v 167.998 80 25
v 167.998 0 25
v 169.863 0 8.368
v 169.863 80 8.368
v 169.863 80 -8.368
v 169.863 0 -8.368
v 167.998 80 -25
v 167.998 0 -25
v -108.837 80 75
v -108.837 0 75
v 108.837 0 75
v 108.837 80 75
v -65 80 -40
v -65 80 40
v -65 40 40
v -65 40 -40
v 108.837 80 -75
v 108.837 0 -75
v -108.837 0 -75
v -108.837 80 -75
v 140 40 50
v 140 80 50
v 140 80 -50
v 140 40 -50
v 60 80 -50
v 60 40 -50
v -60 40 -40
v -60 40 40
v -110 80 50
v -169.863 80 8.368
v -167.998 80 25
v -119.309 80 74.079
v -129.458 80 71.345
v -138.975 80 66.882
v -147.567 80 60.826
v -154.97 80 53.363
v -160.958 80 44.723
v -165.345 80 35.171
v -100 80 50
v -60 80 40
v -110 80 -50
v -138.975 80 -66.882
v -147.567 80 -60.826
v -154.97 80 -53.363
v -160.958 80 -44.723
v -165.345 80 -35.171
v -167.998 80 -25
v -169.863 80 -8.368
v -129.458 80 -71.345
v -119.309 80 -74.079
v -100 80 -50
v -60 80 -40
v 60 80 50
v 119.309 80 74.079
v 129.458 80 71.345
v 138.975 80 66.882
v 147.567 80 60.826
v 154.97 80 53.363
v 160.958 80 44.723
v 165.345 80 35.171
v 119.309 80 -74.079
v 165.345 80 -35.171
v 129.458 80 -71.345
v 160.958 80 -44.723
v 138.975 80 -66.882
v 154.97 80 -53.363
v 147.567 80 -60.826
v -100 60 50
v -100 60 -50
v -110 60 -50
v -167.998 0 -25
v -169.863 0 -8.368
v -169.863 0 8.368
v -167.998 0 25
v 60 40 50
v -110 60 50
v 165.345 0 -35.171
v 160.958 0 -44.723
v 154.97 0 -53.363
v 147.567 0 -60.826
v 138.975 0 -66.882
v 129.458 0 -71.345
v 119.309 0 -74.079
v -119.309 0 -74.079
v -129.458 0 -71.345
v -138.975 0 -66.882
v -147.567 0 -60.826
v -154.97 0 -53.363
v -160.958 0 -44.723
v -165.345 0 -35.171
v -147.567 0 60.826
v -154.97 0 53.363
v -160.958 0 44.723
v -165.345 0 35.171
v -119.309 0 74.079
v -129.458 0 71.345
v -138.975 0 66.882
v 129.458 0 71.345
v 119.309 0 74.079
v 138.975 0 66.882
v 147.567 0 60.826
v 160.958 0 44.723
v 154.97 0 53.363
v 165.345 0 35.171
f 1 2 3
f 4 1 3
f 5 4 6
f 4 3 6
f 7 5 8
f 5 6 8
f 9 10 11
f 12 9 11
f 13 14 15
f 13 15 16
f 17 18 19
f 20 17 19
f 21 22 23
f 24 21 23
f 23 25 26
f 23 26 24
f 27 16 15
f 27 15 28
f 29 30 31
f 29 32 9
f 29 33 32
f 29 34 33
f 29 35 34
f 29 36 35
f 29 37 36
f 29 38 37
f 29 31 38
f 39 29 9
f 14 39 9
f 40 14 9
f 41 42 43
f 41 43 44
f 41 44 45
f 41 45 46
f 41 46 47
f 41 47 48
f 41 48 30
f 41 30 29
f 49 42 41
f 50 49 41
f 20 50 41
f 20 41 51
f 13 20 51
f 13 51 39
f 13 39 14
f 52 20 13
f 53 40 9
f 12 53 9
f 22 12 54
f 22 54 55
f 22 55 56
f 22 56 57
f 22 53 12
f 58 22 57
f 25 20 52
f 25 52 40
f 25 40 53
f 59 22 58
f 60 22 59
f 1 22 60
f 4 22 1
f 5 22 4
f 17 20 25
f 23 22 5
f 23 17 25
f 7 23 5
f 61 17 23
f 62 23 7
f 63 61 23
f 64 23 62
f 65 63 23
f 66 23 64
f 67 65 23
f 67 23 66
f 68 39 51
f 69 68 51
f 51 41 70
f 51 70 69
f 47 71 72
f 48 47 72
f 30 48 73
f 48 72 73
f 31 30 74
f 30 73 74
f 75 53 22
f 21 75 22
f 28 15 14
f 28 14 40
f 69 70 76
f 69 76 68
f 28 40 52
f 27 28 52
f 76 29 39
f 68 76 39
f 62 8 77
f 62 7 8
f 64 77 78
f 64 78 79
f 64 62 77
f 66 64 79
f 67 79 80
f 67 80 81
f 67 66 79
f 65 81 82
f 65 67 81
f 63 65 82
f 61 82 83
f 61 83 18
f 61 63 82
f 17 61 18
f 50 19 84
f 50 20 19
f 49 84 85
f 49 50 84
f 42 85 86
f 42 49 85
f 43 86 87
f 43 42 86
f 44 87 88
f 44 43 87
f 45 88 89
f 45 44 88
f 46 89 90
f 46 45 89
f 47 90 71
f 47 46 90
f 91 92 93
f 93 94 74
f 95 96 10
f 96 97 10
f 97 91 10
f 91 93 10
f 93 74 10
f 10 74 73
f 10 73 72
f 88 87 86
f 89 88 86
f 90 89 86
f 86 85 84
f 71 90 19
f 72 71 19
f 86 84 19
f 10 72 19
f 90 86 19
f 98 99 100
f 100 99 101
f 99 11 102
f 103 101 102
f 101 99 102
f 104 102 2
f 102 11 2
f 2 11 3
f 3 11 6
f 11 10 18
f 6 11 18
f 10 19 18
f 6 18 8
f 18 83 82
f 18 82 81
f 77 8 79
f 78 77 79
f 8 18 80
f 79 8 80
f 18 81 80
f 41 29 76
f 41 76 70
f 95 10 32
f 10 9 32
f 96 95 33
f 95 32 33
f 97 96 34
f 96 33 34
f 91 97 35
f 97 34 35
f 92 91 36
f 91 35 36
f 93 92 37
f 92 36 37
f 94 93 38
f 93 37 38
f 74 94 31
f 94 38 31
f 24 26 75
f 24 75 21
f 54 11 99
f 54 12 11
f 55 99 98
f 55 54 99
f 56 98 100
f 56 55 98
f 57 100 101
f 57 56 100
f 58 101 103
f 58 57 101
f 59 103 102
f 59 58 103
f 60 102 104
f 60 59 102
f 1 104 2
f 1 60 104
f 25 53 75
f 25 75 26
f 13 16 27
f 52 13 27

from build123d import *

# Parameters (mm, degrees)
SALIENTE_EXTRUIR1_DEPTH = 80
REDONDEO1_R             = 60
CROQUIS2_W              = 10
CROQUIS2_H              = 100
CORTAR_EXTRUIR1_DEPTH   = 20
CROQUIS3_W              = 5
CROQUIS3_H              = 80
CORTAR_EXTRUIR2_DEPTH   = 40
CROQUIS4_W              = 80
CROQUIS4_H              = 100
CORTAR_EXTRUIR3_DEPTH   = 40


with BuildPart() as part:
    # Croquis1 → Saliente-Extruir1 (new body)
    with BuildSketch(Plane(origin=(0, 0, 0), x_dir=(1, 0, 0), z_dir=(0, 1, 0))):
        with BuildLine():
            Line((-150, -75), (150, -75))
            ThreePointArc((150, -75), (170.096189432, 0), (150, 75))
            Line((150, 75), (-150, 75))
            ThreePointArc((-150, 75), (-170.096189432, 0), (-150, -75))
        make_face()
    extrude(amount=SALIENTE_EXTRUIR1_DEPTH)

    # Redondeo1
    redondeo1_edges = [part.edges().sort_by_distance(p)[0] for p in [
        (150, 40, 75),
        (-150, 40, 75),
        (-150, 40, -75),
        (150, 40, -75),
    ]]
    fillet(redondeo1_edges, radius=REDONDEO1_R)

    # Croquis2 → Cortar-Extruir1 (cut)
    with BuildSketch(Plane(origin=(0, 80, 0), x_dir=(1, 0, 0), z_dir=(0, 1, 0))):
        with Locations((-105, 0)):
            Rectangle(CROQUIS2_W, CROQUIS2_H)
    extrude(amount=-CORTAR_EXTRUIR1_DEPTH, mode=Mode.SUBTRACT)

    # Croquis3 → Cortar-Extruir2 (cut)
    with BuildSketch(Plane(origin=(0, 80, 0), x_dir=(1, 0, 0), z_dir=(0, 1, 0))):
        with Locations((-62.5, 0)):
            Rectangle(CROQUIS3_W, CROQUIS3_H)
    extrude(amount=-CORTAR_EXTRUIR2_DEPTH, mode=Mode.SUBTRACT)

    # Croquis4 → Cortar-Extruir3 (cut)
    with BuildSketch(Plane(origin=(0, 80, 0), x_dir=(1, 0, 0), z_dir=(0, 1, 0))):
        with Locations((100, 0)):
            Rectangle(CROQUIS4_W, CROQUIS4_H)
    extrude(amount=-CORTAR_EXTRUIR3_DEPTH, mode=Mode.SUBTRACT)


solid = part.part
